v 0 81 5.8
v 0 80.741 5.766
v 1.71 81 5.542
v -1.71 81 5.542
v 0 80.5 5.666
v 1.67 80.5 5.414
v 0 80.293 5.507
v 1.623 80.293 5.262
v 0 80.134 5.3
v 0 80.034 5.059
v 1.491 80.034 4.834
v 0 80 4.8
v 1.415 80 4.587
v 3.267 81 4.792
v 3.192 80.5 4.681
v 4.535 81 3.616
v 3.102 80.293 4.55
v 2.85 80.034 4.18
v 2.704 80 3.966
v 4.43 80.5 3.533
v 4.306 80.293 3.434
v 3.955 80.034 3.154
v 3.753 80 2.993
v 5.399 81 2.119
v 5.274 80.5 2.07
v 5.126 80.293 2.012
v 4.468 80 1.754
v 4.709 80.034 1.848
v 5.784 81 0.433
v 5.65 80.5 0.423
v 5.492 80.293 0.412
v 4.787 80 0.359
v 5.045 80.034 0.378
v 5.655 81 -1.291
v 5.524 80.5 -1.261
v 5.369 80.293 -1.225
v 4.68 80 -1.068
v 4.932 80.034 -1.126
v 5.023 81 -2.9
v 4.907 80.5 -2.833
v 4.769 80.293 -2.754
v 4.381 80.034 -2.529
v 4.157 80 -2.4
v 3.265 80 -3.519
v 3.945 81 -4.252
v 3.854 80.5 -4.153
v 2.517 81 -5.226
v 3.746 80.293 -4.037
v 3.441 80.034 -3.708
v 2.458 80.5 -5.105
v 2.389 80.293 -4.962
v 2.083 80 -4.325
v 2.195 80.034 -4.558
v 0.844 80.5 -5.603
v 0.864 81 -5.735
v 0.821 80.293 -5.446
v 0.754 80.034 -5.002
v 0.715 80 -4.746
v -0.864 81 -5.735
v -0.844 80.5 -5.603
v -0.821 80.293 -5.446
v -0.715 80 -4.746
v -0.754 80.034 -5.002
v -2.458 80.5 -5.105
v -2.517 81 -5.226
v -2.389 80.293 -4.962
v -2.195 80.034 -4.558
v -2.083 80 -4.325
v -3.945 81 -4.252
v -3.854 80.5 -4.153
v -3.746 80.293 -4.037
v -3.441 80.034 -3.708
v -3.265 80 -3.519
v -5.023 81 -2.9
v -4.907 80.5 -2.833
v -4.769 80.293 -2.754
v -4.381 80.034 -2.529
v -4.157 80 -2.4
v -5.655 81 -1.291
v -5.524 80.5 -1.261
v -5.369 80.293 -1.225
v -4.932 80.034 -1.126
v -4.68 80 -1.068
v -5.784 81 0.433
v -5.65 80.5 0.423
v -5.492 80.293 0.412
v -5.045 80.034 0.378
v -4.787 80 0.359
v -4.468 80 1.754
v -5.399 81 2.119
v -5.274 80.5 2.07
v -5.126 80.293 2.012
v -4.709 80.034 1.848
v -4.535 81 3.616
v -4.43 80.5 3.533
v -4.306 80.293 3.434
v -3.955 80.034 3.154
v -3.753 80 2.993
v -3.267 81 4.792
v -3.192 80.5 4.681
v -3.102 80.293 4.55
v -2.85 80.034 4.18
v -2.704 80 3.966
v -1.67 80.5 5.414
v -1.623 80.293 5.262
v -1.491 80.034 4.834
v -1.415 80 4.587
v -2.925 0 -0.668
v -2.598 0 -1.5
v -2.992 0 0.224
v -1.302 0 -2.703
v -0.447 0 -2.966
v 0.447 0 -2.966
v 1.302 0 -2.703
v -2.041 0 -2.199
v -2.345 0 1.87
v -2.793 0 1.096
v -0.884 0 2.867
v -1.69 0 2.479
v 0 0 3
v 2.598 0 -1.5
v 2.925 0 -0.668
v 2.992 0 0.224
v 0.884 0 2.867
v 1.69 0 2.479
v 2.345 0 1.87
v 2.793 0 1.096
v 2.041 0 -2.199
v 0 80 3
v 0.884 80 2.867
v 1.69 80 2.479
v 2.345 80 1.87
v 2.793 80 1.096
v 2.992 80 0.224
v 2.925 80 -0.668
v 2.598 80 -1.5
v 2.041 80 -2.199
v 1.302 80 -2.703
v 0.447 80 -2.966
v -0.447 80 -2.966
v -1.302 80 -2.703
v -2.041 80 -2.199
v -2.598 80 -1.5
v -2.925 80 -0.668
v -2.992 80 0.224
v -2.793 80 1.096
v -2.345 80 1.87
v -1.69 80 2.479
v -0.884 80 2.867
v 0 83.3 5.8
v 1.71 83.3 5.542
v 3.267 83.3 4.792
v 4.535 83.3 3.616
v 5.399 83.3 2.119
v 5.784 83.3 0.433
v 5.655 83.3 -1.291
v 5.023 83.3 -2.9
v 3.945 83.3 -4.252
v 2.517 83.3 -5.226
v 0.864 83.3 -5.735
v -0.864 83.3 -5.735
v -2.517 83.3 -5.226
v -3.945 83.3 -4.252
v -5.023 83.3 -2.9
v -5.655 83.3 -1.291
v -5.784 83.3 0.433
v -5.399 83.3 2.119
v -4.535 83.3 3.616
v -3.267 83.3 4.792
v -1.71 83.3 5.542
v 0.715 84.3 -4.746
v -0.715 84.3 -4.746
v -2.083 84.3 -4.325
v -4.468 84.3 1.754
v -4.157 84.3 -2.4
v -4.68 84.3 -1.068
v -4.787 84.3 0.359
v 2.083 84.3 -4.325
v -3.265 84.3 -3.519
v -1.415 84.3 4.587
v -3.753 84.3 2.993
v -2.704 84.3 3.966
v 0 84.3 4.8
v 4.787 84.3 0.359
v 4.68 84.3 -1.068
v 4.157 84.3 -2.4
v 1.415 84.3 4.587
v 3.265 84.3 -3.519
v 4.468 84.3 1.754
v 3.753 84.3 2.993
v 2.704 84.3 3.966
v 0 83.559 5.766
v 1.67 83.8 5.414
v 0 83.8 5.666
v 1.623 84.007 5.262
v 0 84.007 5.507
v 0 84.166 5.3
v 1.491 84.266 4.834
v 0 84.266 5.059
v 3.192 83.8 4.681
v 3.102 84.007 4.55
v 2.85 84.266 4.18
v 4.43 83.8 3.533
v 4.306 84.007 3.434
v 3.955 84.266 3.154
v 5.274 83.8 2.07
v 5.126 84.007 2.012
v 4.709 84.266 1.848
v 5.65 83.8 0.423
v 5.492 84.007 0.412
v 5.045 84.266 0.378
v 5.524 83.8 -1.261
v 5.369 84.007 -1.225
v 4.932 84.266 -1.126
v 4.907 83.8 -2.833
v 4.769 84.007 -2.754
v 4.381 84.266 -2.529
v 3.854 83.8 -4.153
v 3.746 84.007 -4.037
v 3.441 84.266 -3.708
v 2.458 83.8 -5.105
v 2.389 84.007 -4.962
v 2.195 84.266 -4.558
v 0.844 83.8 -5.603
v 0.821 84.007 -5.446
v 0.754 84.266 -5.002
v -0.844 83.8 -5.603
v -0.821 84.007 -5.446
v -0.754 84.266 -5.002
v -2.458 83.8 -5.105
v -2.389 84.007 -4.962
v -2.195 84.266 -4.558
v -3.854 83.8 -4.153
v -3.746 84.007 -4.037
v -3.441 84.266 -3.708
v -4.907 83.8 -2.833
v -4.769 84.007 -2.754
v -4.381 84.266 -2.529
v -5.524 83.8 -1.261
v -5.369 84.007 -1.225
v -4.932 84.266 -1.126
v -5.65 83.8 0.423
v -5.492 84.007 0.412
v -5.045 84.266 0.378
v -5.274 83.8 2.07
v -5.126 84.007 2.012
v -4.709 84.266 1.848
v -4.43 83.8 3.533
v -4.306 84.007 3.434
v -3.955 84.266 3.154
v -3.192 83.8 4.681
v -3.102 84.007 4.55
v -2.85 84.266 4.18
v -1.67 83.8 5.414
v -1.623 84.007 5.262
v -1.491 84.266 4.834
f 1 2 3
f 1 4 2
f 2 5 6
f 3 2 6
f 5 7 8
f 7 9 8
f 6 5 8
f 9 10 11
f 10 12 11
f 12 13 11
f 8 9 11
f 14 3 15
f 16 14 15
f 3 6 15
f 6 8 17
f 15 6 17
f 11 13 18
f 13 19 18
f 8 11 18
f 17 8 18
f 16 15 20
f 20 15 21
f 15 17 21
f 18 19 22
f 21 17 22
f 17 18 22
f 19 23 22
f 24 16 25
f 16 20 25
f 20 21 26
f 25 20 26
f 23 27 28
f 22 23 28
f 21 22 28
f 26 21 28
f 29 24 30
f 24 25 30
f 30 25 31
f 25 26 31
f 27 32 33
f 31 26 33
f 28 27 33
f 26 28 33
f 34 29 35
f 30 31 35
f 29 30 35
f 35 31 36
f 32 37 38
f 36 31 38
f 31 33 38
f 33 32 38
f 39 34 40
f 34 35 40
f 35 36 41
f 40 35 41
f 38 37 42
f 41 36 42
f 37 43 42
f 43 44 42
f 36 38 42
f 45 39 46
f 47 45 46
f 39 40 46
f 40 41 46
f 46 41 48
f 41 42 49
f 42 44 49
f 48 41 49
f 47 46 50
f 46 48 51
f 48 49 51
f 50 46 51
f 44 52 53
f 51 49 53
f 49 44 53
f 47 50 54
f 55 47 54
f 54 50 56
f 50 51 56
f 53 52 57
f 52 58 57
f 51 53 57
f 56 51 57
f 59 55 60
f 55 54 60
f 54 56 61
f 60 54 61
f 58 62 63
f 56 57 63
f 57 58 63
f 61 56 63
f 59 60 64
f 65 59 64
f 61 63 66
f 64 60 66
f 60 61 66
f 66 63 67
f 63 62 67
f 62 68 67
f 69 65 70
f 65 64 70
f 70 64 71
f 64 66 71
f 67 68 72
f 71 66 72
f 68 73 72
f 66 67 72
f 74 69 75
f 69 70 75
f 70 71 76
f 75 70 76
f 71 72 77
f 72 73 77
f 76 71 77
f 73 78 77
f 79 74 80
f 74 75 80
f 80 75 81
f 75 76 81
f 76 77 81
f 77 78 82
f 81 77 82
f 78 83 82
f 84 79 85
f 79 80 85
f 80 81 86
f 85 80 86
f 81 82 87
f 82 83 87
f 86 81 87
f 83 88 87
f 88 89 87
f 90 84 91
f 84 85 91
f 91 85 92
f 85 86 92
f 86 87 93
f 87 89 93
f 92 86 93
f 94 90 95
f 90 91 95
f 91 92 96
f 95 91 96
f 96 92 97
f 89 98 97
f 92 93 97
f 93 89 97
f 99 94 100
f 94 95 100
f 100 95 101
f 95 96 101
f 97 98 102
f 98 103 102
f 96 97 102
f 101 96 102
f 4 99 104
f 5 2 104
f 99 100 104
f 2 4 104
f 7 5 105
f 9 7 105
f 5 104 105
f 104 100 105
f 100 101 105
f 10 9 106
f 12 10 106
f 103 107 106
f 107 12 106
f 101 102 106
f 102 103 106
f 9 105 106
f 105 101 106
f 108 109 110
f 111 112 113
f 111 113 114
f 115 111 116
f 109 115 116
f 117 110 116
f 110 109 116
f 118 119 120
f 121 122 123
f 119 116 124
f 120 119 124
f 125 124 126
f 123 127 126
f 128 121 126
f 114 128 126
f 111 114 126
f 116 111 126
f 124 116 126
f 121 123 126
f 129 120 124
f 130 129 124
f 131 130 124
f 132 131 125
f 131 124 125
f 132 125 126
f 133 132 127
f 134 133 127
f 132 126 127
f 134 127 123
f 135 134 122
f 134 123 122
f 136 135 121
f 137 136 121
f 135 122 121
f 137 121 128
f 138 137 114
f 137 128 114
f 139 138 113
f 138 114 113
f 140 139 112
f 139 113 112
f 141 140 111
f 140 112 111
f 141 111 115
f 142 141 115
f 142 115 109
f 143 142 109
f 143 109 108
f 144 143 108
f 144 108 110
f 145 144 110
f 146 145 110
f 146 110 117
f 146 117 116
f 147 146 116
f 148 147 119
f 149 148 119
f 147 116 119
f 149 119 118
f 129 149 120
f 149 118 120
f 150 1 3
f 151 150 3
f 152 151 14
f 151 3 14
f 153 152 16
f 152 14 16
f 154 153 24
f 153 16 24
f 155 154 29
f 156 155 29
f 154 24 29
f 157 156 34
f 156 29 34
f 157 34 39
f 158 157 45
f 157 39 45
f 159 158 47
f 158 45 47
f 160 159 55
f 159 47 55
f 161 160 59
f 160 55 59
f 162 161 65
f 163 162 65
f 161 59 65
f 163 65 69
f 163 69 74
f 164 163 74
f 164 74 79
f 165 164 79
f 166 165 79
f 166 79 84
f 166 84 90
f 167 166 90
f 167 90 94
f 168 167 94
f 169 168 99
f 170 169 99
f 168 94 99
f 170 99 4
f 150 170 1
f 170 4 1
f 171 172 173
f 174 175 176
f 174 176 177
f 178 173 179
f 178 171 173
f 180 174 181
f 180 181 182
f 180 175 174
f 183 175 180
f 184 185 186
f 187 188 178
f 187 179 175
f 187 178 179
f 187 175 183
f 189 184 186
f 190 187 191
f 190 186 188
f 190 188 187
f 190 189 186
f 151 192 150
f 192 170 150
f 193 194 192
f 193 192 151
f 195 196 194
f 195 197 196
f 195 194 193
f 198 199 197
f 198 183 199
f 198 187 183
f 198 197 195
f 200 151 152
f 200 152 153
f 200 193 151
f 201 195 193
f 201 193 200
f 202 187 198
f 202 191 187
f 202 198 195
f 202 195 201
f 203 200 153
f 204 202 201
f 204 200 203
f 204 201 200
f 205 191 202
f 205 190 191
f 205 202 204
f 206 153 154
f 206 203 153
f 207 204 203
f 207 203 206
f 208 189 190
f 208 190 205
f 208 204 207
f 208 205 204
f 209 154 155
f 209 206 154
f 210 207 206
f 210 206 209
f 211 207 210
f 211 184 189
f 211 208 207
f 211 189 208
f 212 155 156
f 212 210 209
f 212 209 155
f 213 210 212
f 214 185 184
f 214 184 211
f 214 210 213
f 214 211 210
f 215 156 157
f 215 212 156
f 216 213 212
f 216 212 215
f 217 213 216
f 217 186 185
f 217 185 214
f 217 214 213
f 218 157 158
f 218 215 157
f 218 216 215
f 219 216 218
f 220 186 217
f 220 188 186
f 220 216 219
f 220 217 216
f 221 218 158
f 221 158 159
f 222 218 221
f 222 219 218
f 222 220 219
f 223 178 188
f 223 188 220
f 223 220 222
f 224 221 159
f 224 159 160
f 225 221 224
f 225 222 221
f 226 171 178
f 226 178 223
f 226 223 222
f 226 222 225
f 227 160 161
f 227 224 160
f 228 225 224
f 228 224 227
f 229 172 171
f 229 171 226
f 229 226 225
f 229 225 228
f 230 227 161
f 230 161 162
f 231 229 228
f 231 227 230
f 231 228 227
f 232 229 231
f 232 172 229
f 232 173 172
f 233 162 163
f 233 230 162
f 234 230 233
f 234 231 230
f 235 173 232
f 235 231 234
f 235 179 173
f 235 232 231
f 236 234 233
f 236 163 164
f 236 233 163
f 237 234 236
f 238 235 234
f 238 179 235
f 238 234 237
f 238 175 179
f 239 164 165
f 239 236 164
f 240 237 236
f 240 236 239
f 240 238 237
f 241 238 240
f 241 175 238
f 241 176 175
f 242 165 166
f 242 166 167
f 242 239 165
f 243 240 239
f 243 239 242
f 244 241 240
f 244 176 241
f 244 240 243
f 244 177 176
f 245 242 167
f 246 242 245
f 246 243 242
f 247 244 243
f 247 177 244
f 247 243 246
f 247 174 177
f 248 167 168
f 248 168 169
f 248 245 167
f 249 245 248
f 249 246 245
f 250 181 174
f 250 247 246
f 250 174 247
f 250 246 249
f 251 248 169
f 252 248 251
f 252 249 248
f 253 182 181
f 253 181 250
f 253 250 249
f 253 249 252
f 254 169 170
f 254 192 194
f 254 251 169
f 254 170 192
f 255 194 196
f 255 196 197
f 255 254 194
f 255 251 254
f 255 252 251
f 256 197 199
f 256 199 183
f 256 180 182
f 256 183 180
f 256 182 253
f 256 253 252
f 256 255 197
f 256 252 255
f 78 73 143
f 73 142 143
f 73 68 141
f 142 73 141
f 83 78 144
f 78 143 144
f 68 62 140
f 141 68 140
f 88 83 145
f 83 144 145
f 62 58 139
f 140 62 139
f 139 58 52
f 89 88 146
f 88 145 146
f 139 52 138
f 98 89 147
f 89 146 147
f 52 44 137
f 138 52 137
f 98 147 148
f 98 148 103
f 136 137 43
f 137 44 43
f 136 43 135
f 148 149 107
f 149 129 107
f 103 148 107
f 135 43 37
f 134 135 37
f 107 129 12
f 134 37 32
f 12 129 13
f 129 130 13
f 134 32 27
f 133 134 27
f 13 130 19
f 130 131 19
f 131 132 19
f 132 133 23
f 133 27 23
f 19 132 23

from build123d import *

# Parameters (mm, degrees)
SKETCH1_R           = 3
BOSS_EXTRUDE1_DEPTH = 80
SKETCH2_R           = 5.8
BOSS_EXTRUDE2_DEPTH = 4.3
FILLET1_R           = 1


with BuildPart() as part:
    # Sketch1 → Boss-Extrude1 (new body)
    with BuildSketch(Plane(origin=(0, 0, 0), x_dir=(1, 0, 0), z_dir=(0, 1, 0))):
        with Locations(Location((0, 0, 0), (0, 0, 270))):  # turned: the seam where the file's is
            Circle(SKETCH1_R)
    extrude(amount=BOSS_EXTRUDE1_DEPTH)

    # Sketch2 → Boss-Extrude2 (add)
    with BuildSketch(Plane(origin=(0, 80, 0), x_dir=(1, 0, 0), z_dir=(0, 1, 0))):
        with Locations(Location((0, 0, 0), (0, 0, 270))):  # turned: the seam where the file's is
            Circle(SKETCH2_R)
    extrude(amount=BOSS_EXTRUDE2_DEPTH)

    # Fillet1
    fillet1_edges = [part.edges().sort_by_distance(p)[0] for p in [
        (0, 80, -5.8),
        (0, 84.3, -5.8),
    ]]
    fillet(fillet1_edges, radius=FILLET1_R)


solid = part.part
